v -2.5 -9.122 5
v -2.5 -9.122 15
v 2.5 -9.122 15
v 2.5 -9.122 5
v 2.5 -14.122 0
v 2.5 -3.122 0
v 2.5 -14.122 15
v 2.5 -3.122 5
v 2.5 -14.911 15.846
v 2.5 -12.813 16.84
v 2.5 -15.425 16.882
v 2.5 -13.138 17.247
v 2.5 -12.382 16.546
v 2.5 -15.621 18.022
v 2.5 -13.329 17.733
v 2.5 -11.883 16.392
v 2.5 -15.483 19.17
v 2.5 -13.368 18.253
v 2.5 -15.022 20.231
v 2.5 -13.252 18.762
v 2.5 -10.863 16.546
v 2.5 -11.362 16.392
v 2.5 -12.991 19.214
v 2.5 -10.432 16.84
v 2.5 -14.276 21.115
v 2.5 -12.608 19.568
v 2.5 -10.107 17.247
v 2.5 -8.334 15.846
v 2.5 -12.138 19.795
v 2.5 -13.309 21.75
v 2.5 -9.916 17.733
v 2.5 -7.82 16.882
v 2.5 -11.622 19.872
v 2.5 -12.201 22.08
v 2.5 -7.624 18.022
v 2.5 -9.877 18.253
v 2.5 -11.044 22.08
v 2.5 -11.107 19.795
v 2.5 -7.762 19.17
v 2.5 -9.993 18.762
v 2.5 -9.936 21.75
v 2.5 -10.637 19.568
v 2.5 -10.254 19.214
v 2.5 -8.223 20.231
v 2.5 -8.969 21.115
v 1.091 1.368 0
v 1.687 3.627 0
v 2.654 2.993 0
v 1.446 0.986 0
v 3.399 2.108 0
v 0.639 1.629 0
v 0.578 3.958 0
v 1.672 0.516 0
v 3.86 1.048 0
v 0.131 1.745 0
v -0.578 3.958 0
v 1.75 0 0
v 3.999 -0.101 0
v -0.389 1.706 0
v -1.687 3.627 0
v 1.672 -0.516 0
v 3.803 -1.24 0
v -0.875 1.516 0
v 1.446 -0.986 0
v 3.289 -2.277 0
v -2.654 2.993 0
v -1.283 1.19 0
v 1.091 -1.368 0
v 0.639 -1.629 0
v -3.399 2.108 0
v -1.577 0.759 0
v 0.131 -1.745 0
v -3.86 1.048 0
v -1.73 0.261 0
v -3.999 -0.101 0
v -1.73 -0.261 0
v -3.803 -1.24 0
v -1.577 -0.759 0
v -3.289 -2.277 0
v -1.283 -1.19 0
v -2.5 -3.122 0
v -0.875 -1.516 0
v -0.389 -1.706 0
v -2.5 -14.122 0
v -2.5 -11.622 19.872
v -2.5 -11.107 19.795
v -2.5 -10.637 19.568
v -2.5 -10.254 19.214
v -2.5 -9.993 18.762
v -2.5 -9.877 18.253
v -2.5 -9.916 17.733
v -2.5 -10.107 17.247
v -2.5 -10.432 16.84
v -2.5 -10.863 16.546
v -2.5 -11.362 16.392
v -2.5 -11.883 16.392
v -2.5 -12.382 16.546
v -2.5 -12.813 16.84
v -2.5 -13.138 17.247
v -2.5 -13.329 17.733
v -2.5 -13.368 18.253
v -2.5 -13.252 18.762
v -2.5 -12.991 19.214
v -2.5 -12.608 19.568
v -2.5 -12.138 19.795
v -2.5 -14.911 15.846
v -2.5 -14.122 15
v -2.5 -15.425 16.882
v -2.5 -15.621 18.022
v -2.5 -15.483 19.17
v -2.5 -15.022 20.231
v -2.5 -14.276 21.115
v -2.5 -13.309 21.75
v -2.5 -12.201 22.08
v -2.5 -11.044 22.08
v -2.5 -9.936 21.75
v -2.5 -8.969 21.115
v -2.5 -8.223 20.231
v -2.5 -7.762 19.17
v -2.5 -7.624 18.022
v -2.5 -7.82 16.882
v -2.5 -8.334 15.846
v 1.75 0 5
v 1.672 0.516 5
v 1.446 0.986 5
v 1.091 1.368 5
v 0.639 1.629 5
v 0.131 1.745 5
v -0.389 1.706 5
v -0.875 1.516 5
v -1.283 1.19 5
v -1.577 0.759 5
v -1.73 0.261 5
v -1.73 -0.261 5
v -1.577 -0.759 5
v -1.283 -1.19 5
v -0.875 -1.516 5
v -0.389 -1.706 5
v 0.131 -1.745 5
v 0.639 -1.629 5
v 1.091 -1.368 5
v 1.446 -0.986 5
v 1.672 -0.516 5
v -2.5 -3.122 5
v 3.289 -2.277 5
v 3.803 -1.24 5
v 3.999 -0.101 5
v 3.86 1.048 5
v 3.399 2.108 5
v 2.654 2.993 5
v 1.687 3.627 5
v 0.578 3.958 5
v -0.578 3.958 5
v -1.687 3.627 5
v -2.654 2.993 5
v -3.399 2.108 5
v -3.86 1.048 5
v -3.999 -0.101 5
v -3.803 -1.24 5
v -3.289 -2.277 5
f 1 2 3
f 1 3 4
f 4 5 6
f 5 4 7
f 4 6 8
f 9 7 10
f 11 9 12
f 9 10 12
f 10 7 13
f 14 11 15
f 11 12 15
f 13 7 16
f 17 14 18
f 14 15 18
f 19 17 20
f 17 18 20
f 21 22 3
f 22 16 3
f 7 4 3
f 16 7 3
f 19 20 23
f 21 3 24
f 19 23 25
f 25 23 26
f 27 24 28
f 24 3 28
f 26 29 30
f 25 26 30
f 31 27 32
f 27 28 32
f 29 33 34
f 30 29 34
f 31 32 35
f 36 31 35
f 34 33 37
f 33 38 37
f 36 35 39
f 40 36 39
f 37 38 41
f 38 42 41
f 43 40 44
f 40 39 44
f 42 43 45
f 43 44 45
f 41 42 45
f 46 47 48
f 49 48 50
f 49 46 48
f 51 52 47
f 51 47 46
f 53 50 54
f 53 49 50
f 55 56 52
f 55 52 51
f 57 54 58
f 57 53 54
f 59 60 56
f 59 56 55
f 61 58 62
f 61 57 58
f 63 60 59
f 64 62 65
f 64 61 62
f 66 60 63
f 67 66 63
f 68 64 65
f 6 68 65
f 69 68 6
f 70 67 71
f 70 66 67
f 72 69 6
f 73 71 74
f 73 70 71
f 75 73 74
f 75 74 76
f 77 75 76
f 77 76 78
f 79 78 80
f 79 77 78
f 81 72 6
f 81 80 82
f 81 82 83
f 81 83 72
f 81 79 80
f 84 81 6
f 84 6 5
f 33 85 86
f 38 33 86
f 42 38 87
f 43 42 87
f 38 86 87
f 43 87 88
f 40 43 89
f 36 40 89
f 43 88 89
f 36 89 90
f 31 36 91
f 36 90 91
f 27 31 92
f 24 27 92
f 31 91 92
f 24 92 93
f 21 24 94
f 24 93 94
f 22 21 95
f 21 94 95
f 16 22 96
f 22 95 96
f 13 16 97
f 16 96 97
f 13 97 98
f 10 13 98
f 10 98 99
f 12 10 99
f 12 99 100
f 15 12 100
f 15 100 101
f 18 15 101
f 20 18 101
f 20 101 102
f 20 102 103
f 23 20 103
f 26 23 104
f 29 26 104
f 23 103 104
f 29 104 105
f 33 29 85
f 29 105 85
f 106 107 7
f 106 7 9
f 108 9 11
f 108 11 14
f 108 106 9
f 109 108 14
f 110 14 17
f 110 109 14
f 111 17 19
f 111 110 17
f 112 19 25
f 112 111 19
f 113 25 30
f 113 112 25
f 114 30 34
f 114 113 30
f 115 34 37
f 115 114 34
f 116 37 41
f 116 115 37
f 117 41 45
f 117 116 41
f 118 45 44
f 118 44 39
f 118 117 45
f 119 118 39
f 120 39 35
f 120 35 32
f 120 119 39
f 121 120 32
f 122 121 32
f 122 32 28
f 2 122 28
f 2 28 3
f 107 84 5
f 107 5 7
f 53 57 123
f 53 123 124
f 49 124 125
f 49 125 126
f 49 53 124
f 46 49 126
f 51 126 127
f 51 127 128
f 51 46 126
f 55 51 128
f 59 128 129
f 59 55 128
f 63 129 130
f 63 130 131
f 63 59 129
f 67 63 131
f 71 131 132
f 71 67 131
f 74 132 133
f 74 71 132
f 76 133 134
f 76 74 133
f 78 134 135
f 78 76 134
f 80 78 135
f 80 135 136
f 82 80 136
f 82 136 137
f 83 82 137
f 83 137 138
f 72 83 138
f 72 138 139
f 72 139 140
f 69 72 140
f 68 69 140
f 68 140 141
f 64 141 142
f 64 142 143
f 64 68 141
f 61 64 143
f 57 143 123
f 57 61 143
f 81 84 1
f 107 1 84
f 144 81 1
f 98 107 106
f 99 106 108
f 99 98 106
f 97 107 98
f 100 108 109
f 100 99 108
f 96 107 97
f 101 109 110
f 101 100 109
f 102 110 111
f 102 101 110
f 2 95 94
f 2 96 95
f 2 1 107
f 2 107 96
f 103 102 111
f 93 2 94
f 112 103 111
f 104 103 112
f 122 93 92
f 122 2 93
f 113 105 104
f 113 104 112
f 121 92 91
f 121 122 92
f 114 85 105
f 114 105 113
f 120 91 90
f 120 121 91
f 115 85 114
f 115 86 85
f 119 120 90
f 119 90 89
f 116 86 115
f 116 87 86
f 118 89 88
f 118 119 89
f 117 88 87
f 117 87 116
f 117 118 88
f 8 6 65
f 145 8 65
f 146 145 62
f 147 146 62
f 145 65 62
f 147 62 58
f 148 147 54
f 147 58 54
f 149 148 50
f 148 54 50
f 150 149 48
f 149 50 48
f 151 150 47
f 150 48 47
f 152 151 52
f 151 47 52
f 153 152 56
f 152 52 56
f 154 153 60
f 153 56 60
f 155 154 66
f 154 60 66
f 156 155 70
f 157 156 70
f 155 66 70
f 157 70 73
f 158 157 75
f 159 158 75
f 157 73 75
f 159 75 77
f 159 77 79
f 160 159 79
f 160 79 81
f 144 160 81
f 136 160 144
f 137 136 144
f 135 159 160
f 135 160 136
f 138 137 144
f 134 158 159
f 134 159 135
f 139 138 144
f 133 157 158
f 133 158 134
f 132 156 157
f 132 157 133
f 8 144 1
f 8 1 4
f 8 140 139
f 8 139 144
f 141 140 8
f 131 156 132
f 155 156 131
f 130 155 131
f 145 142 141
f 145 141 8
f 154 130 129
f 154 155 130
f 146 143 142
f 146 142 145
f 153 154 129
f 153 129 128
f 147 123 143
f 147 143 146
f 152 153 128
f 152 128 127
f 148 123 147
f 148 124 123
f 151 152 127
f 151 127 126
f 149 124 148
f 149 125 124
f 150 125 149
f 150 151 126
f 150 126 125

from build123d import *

# Parameters (mm, degrees)
ESBO_O1_R                = 1.75
RESSALTO_EXTRUS_O1_DEPTH = 5
ESBO_O2_R                = 1.75
RESSALTO_EXTRUS_O2_DEPTH = 5


with BuildPart() as part:
    # Esboço1 → Ressalto-extrusão1 (new body)
    with BuildSketch(Plane.XY):
        with BuildLine():
            Line((-2.5, -3.122498999), (-2.5, -9.122498999))
            Line((-2.5, -9.122498999), (2.5, -9.122498999))
            Line((2.5, -9.122498999), (2.5, -3.122498999))
            ThreePointArc((2.5, -3.122498999), (0, 4), (-2.5, -3.122498999))
        make_face()
        Circle(ESBO_O1_R, mode=Mode.SUBTRACT)
    extrude(amount=RESSALTO_EXTRUS_O1_DEPTH)

    # Esboço2 → Ressalto-extrusão2 (add)
    with BuildSketch(Plane.ZY.offset(2.5)):
        with BuildLine():
            Line((0, -9.122498999), (0, -14.122498999))
            Line((0, -14.122498999), (15, -14.122498999))
            ThreePointArc((15, -14.122498999), (22.122498999, -11.622498999), (15, -9.122498999))
            Line((15, -9.122498999), (0, -9.122498999))
        make_face()
        with Locations((18.122498999, -11.622498999)):
            Circle(ESBO_O2_R, mode=Mode.SUBTRACT)
    extrude(amount=-RESSALTO_EXTRUS_O2_DEPTH)


solid = part.part
